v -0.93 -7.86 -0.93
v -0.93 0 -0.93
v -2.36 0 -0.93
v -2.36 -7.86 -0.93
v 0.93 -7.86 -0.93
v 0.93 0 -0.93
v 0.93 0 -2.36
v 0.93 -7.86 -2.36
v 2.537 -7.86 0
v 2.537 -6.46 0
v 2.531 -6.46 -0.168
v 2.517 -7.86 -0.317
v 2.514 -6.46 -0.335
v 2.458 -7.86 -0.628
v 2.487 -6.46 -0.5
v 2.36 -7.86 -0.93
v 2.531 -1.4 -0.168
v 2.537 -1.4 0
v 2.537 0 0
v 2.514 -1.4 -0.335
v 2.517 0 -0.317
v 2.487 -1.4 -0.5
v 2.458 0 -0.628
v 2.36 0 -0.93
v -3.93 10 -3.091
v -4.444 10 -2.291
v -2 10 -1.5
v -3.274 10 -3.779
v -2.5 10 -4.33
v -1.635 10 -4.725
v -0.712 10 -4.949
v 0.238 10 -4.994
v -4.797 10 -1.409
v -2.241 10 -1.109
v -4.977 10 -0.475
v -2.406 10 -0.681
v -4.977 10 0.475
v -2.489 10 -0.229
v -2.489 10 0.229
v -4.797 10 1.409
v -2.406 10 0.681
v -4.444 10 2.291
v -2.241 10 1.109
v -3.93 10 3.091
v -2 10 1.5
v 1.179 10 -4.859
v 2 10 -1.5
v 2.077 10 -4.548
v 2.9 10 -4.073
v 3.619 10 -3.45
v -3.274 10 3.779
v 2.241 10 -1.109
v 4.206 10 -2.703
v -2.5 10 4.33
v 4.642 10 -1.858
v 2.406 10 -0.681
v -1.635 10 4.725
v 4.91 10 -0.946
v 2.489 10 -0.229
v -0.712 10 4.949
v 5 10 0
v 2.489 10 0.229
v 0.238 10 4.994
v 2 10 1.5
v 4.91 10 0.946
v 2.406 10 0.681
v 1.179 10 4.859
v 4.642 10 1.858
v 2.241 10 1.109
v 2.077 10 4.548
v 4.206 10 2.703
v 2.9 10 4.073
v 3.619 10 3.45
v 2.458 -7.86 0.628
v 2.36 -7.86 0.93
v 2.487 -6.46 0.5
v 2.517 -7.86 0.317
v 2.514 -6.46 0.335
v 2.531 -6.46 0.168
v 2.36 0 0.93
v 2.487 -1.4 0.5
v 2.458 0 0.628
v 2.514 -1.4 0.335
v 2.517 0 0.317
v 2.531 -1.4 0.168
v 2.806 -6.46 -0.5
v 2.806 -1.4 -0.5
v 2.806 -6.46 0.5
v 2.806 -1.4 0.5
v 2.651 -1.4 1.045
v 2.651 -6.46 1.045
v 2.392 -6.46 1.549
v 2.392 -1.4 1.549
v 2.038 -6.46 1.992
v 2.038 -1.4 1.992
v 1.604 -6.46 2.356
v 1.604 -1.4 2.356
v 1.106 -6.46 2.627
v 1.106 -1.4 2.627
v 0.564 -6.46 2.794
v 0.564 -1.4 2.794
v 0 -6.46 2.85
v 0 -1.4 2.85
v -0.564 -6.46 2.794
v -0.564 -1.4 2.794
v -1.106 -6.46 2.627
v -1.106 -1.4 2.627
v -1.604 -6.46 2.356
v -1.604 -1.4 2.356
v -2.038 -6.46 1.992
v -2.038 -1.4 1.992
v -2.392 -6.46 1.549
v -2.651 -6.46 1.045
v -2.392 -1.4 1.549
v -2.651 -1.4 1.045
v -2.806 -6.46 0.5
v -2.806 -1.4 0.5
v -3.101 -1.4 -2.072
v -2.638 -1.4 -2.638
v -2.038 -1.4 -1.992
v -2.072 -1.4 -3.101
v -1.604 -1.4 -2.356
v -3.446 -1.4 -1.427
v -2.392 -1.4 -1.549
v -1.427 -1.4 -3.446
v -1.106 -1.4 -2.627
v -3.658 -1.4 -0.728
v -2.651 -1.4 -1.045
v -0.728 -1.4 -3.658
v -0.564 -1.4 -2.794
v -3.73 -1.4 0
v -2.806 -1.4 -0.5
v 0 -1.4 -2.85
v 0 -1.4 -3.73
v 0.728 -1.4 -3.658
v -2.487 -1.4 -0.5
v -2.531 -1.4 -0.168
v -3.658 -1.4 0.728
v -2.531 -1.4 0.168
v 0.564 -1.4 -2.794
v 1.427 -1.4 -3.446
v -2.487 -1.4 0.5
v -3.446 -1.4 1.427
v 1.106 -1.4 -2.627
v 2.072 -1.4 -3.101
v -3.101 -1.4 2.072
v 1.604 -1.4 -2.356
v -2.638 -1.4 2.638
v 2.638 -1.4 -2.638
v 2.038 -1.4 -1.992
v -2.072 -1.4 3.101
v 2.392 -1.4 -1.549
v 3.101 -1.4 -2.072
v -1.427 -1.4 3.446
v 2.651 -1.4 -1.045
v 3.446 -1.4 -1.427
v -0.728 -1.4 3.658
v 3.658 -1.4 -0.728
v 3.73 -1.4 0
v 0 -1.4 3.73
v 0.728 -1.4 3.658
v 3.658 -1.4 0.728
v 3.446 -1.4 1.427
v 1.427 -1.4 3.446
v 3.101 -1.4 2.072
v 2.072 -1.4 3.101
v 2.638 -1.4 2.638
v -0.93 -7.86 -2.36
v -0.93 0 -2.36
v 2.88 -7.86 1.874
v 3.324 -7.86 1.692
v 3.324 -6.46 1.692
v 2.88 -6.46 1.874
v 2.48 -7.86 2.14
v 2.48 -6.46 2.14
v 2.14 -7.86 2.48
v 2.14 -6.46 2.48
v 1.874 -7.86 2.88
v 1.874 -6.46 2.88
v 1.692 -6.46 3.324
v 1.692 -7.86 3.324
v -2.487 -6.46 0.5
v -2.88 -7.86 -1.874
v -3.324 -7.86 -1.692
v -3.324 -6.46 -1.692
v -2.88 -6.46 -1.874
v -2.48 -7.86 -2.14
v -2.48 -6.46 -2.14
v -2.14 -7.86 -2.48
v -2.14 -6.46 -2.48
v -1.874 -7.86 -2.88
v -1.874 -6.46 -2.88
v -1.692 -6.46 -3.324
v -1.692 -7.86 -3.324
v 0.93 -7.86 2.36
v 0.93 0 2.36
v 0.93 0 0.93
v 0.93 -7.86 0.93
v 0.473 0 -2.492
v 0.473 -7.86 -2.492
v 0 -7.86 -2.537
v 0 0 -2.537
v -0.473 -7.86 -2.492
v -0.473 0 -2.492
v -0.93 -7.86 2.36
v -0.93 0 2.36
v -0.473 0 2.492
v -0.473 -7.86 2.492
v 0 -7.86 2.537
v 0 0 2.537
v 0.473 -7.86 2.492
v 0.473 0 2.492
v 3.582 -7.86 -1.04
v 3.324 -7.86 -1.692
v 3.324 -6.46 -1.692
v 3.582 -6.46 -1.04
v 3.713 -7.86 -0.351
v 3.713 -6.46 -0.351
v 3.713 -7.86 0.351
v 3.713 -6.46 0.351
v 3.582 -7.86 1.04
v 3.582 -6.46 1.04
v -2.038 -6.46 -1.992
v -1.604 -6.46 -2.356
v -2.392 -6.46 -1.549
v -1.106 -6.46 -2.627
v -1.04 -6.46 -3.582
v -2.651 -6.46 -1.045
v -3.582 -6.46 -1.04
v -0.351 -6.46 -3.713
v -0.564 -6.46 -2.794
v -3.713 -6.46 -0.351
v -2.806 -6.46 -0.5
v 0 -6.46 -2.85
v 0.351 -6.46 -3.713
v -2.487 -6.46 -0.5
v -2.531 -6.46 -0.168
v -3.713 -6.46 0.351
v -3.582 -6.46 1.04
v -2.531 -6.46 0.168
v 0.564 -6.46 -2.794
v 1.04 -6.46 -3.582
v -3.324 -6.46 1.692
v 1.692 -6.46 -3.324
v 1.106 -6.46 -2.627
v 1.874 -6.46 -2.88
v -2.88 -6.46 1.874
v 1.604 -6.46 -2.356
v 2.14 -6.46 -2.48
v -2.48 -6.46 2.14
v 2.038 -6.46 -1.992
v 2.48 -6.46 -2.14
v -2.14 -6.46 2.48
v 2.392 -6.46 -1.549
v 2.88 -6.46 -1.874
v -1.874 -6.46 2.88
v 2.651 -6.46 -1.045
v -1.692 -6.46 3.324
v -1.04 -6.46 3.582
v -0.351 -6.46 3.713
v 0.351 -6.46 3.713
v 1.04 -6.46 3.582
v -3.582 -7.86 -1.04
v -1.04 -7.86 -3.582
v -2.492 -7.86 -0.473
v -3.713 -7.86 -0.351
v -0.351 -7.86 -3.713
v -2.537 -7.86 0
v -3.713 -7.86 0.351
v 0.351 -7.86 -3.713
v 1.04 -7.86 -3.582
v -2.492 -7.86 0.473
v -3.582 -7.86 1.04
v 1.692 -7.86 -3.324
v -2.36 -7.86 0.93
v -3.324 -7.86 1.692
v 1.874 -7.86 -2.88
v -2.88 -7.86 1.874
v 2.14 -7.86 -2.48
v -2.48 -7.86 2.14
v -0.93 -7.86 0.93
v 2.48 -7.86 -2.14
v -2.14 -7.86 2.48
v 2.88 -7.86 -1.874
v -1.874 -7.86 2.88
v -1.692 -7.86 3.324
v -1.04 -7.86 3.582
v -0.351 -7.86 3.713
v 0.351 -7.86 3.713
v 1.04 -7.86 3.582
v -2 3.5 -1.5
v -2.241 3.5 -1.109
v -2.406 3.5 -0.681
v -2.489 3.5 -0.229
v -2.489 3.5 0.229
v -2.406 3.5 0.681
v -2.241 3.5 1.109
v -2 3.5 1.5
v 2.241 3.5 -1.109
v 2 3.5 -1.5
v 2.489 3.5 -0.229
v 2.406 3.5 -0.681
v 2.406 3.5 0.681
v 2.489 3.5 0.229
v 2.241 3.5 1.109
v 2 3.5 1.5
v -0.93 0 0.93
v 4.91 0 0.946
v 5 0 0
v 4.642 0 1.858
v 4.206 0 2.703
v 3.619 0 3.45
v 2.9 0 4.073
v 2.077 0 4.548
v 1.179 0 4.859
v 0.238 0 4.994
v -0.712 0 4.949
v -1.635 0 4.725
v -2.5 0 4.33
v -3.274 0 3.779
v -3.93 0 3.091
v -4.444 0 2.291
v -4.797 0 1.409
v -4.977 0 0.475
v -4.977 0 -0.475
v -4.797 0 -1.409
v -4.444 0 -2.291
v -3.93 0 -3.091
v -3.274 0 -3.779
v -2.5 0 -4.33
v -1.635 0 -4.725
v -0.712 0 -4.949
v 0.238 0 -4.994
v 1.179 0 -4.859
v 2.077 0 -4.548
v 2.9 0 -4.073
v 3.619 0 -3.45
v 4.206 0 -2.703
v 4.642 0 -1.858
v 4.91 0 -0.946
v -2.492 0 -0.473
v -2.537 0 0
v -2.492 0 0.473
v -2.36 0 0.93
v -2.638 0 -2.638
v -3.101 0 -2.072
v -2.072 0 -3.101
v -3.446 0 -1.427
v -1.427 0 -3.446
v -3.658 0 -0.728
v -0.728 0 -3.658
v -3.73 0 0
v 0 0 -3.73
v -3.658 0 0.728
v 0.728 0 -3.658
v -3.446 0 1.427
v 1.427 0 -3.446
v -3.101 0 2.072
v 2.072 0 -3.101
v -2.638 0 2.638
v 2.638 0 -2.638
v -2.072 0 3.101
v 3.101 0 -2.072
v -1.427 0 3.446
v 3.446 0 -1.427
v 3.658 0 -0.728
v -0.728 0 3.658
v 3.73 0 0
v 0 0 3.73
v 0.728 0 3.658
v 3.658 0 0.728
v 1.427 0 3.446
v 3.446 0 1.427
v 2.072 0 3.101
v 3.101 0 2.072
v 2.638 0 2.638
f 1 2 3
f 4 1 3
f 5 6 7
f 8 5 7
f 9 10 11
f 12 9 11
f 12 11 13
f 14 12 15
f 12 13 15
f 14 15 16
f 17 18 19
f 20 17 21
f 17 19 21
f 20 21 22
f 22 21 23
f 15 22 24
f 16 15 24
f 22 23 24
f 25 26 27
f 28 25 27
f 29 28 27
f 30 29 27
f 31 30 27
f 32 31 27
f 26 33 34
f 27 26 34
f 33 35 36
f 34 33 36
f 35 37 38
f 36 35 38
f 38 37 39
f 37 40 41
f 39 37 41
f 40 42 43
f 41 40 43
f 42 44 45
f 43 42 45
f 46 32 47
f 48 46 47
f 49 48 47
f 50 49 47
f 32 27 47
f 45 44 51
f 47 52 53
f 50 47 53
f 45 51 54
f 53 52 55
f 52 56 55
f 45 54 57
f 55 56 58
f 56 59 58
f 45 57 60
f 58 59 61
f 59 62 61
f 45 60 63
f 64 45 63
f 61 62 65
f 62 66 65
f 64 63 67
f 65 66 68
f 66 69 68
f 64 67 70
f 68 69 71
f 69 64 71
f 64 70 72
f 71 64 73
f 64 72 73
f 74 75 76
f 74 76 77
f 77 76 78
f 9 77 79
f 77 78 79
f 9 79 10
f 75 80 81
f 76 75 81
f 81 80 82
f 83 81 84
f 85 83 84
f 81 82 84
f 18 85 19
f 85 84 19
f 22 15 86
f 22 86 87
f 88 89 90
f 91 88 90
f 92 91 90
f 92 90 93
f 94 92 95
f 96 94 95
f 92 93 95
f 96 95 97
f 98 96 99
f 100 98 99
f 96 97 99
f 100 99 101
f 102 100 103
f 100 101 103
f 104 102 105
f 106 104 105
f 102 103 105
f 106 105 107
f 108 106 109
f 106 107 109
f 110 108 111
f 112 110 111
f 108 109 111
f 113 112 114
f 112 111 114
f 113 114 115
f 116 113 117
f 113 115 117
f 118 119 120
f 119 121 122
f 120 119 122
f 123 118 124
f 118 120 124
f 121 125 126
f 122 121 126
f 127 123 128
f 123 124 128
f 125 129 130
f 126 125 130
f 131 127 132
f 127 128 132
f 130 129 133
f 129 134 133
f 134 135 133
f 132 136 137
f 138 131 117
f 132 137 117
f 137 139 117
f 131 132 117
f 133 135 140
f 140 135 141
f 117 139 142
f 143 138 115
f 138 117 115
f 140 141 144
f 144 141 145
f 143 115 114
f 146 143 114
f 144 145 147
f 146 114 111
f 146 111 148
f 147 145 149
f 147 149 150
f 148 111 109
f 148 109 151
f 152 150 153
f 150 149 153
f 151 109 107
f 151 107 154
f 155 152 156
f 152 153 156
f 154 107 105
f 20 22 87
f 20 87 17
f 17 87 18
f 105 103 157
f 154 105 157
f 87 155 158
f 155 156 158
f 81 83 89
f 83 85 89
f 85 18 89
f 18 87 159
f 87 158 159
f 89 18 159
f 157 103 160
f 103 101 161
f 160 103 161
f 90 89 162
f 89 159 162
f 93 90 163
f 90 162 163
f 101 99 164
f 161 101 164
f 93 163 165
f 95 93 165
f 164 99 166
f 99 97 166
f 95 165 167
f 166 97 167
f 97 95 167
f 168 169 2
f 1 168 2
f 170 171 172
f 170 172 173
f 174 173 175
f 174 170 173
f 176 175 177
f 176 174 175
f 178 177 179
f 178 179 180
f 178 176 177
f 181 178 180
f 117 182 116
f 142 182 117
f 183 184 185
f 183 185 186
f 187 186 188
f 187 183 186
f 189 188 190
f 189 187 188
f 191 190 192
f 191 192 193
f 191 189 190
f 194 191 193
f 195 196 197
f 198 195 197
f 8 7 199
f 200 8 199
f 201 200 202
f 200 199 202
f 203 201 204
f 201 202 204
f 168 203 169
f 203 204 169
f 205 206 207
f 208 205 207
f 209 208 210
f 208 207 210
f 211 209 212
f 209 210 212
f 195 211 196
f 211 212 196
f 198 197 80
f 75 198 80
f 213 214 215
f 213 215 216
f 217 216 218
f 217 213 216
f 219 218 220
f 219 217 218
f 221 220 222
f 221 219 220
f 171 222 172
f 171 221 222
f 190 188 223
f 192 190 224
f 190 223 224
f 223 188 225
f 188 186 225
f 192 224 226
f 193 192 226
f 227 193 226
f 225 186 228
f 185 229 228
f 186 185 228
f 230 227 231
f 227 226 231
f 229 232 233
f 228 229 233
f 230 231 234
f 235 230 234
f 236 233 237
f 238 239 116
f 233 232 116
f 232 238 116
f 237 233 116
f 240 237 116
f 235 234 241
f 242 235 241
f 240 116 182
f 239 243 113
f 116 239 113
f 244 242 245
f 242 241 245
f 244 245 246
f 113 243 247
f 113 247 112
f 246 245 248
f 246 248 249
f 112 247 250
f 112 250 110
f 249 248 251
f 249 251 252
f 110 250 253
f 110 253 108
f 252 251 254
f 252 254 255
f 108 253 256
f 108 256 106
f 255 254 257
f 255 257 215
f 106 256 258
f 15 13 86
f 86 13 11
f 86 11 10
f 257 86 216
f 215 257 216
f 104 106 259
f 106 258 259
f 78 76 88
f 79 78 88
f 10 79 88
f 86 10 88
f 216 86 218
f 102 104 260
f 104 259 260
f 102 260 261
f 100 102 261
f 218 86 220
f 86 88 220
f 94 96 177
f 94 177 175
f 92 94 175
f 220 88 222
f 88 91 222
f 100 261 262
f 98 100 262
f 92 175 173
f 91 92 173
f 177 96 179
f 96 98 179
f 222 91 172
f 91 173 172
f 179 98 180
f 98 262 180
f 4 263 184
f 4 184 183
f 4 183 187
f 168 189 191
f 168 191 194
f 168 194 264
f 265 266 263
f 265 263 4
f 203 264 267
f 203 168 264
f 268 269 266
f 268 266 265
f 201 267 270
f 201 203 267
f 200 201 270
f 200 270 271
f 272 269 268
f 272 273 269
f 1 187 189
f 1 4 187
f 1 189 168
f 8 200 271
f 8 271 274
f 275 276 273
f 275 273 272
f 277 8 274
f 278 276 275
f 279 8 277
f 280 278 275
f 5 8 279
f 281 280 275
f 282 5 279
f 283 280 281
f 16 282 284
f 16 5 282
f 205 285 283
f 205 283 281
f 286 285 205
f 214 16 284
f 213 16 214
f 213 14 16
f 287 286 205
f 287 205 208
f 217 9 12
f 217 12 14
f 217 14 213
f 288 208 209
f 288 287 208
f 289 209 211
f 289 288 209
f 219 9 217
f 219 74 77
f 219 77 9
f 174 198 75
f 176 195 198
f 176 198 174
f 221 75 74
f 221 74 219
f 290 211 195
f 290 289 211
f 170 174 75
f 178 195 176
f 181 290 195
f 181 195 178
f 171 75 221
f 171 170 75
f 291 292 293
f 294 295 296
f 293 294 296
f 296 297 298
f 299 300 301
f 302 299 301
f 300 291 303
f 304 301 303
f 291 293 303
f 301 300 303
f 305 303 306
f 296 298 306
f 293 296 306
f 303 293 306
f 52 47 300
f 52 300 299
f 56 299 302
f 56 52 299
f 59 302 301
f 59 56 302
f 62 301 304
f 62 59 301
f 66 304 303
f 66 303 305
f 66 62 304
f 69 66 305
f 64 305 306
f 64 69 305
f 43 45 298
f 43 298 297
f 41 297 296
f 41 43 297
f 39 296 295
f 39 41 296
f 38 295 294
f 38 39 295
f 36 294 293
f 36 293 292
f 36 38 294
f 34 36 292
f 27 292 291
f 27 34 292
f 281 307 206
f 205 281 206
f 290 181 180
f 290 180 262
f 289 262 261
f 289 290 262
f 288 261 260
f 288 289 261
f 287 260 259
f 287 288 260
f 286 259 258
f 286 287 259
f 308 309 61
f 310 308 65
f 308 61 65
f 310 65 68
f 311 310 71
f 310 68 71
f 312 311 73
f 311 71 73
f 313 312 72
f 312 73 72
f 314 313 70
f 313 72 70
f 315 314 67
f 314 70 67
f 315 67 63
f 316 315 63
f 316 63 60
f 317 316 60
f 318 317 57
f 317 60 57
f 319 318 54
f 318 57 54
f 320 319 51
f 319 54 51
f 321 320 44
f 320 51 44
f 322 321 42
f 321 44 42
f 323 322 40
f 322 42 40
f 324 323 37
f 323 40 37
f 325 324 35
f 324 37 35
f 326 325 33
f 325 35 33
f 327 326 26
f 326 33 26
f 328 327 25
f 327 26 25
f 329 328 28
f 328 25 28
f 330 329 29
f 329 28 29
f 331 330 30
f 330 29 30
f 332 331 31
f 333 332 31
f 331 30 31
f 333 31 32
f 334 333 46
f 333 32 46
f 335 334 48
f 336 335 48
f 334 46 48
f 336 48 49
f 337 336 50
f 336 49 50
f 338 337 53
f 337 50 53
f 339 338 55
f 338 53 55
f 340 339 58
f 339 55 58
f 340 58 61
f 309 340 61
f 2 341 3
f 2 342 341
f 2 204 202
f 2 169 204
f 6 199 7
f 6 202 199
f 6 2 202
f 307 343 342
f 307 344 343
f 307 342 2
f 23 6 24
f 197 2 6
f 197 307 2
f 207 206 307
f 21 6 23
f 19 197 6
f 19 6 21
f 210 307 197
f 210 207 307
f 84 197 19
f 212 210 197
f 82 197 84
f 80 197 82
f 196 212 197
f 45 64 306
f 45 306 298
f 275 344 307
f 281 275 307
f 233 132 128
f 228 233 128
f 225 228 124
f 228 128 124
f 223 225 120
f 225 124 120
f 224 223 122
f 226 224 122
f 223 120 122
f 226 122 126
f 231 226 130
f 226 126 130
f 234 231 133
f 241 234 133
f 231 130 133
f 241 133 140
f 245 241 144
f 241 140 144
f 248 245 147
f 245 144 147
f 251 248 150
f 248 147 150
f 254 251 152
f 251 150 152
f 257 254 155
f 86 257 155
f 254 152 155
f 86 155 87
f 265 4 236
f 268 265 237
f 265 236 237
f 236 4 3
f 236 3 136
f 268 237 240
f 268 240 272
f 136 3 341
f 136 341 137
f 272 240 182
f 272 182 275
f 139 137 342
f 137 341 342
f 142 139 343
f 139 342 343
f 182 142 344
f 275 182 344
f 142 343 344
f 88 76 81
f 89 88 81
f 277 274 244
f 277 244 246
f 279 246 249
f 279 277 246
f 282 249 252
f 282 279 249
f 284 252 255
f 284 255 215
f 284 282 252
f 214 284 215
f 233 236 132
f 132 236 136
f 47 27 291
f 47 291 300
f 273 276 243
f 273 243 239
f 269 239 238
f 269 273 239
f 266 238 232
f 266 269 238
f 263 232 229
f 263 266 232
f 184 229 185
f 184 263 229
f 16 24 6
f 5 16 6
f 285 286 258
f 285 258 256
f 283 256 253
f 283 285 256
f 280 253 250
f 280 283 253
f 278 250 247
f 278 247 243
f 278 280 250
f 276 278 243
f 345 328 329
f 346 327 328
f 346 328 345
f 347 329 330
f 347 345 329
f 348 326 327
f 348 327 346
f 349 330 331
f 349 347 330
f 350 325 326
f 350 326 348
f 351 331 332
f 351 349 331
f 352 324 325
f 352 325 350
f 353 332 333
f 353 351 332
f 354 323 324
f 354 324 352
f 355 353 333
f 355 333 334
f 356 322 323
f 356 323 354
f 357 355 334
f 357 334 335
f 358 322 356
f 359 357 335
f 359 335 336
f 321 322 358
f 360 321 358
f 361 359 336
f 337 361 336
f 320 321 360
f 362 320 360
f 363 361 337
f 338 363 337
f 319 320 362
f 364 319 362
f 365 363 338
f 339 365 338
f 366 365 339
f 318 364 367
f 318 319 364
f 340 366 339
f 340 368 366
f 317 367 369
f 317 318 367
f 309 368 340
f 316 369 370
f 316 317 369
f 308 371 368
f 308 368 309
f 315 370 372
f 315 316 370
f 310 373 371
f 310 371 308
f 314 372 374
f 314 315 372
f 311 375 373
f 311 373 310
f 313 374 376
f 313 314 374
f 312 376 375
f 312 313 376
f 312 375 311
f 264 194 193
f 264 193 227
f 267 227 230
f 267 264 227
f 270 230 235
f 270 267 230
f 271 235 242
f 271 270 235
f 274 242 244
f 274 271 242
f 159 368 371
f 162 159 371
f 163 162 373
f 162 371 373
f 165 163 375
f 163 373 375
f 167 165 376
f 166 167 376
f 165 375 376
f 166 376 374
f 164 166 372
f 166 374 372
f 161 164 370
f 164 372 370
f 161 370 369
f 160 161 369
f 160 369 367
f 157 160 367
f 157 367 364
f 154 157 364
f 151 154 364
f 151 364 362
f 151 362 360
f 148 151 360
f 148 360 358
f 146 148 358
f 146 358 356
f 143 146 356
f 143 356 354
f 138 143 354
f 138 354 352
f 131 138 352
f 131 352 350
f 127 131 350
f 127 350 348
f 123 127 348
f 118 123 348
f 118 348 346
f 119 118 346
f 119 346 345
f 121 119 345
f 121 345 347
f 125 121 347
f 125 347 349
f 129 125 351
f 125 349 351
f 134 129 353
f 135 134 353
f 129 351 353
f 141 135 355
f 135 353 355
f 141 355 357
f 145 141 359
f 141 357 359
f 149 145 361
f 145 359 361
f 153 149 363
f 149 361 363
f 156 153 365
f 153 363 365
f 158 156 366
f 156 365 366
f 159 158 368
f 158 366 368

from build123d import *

# Parameters (mm, degrees)
F0_R      = 3.73
F3_DEPTH  = 1.4
F2_R      = 2.85
F4_DEPTH  = 1.4
F1_R      = 2.85
F5_DEPTH  = 7.86
F6_DEPTH  = 7.86
F7_DEPTH  = 7.86
F8_DEPTH  = 7.86
F9_DEPTH  = 7.86
F10_R     = 2.85
F11_DEPTH = 1.4
F12_W     = 5.06
F12_H     = 1
F13_DEPTH = 8
F14_W     = 5.06
F14_H     = 1
F15_DEPTH = 8
F17_R     = 5
F18_DEPTH = 10
F20_DEPTH = 6.5


with BuildPart() as f3:
    # F0 (on Front) → F3 (new body)
    with BuildSketch(Plane.XZ):
        Circle(F0_R)
    extrude(amount=F3_DEPTH)

    # F2 (on Front) → F4 (cut)
    with BuildSketch(Plane.XZ):
        Circle(F2_R)
    extrude(amount=F4_DEPTH, mode=Mode.SUBTRACT)

    # F1 (on Front) → F5 (join)
    with BuildSketch(Plane.XZ):
        Circle(F1_R)
        with BuildLine():
            ThreePointArc((-0.93, 2.36), (0, 2.536632), (0.93, 2.36))
            ThreePointArc((0.93, 2.36), (1.793669, 1.793669), (2.36, 0.93))
            ThreePointArc((2.36, 0.93), (2.492083, 0.473312), (2.536632, 0))
            ThreePointArc((2.536632, 0), (2.492083, -0.473312), (2.36, -0.93))
            ThreePointArc((2.36, -0.93), (1.793669, -1.793669), (0.93, -2.36))
            ThreePointArc((0.93, -2.36), (0, -2.536632), (-0.93, -2.36))
            ThreePointArc((-0.93, -2.36), (-1.793669, -1.793669), (-2.36, -0.93))
            ThreePointArc((-2.36, -0.93), (-2.536632, 0), (-2.36, 0.93))
            ThreePointArc((-2.36, 0.93), (-1.793669, 1.793669), (-0.93, 2.36))
        make_face(mode=Mode.SUBTRACT)
    extrude(amount=F5_DEPTH)

    # F1 (on Front) → F6 (join)
    with BuildSketch(Plane.XZ):
        with BuildLine():
            ThreePointArc((2.36, 0.93), (1.793669, 1.793669), (0.93, 2.36))
            Line((0.93, 2.36), (0.93, 0.93))
            Line((0.93, 0.93), (2.36, 0.93))
        make_face()
    extrude(amount=F6_DEPTH)

    # F1 (on Front) → F7 (join)
    with BuildSketch(Plane.XZ):
        with BuildLine():
            Line((-0.93, -0.93), (-2.36, -0.93))
            ThreePointArc((-2.36, -0.93), (-1.793669, -1.793669), (-0.93, -2.36))
            Line((-0.93, -2.36), (-0.93, -0.93))
        make_face()
    extrude(amount=F7_DEPTH)

    # F1 (on Front) → F8 (join)
    with BuildSketch(Plane.XZ):
        with BuildLine():
            Line((-0.93, 0.93), (-0.93, 2.36))
            ThreePointArc((-0.93, 2.36), (-1.793669, 1.793669), (-2.36, 0.93))
            Line((-2.36, 0.93), (-0.93, 0.93))
        make_face()
    extrude(amount=F8_DEPTH)

    # F1 (on Front) → F9 (join)
    with BuildSketch(Plane.XZ):
        with BuildLine():
            ThreePointArc((0.93, -2.36), (1.793669, -1.793669), (2.36, -0.93))
            Line((2.36, -0.93), (0.93, -0.93))
            Line((0.93, -0.93), (0.93, -2.36))
        make_face()
    extrude(amount=F9_DEPTH)

    # F10 (on face) → F11 (join)
    with BuildSketch(Plane.XZ.offset(7.86)):
        with BuildLine():
            ThreePointArc((-1.691716, 3.324304), (-2.301731, 2.301731), (-3.324304, 1.691716))
            ThreePointArc((-3.324304, 1.691716), (-3.73, 0), (-3.324304, -1.691716))
            ThreePointArc((-3.324304, -1.691716), (-2.301731, -2.301731), (-1.691716, -3.324304))
            ThreePointArc((-1.691716, -3.324304), (0, -3.73), (1.691716, -3.324304))
            ThreePointArc((1.691716, -3.324304), (2.301731, -2.301731), (3.324304, -1.691716))
            ThreePointArc((3.324304, -1.691716), (3.73, 0), (3.324304, 1.691716))
            ThreePointArc((3.324304, 1.691716), (2.301731, 2.301731), (1.691716, 3.324304))
            ThreePointArc((1.691716, 3.324304), (0, 3.73), (-1.691716, 3.324304))
        make_face()
        Circle(F10_R, mode=Mode.SUBTRACT)
    extrude(amount=-F11_DEPTH)

    # F12 (on Right) → F13 (cut)
    with BuildSketch(Plane.YZ):
        with Locations((-3.93, 0)):
            Rectangle(F12_W, F12_H)
    extrude(amount=-F13_DEPTH, mode=Mode.SUBTRACT)

    # F14 (on Right) → F15 (cut)
    with BuildSketch(Plane.YZ):
        with Locations((-3.93, 0)):
            Rectangle(F14_W, F14_H)
    extrude(amount=F15_DEPTH, mode=Mode.SUBTRACT)

    # F17 (on offset) → F18 (join)
    with BuildSketch(Plane.XZ.offset(-10)):
        Circle(F17_R)
    extrude(amount=F18_DEPTH)

    # F19 (on offset) → F20 (cut)
    with BuildSketch(Plane.XZ.offset(-10)):
        with BuildLine():
            Line((2, 1.5), (-2, 1.5))
            ThreePointArc((-2, 1.5), (-2.5, 0), (-2, -1.5))
            Line((-2, -1.5), (2, -1.5))
            ThreePointArc((2, -1.5), (2.5, 0), (2, 1.5))
        make_face()
    extrude(amount=F20_DEPTH, mode=Mode.SUBTRACT)


solid = f3.part
